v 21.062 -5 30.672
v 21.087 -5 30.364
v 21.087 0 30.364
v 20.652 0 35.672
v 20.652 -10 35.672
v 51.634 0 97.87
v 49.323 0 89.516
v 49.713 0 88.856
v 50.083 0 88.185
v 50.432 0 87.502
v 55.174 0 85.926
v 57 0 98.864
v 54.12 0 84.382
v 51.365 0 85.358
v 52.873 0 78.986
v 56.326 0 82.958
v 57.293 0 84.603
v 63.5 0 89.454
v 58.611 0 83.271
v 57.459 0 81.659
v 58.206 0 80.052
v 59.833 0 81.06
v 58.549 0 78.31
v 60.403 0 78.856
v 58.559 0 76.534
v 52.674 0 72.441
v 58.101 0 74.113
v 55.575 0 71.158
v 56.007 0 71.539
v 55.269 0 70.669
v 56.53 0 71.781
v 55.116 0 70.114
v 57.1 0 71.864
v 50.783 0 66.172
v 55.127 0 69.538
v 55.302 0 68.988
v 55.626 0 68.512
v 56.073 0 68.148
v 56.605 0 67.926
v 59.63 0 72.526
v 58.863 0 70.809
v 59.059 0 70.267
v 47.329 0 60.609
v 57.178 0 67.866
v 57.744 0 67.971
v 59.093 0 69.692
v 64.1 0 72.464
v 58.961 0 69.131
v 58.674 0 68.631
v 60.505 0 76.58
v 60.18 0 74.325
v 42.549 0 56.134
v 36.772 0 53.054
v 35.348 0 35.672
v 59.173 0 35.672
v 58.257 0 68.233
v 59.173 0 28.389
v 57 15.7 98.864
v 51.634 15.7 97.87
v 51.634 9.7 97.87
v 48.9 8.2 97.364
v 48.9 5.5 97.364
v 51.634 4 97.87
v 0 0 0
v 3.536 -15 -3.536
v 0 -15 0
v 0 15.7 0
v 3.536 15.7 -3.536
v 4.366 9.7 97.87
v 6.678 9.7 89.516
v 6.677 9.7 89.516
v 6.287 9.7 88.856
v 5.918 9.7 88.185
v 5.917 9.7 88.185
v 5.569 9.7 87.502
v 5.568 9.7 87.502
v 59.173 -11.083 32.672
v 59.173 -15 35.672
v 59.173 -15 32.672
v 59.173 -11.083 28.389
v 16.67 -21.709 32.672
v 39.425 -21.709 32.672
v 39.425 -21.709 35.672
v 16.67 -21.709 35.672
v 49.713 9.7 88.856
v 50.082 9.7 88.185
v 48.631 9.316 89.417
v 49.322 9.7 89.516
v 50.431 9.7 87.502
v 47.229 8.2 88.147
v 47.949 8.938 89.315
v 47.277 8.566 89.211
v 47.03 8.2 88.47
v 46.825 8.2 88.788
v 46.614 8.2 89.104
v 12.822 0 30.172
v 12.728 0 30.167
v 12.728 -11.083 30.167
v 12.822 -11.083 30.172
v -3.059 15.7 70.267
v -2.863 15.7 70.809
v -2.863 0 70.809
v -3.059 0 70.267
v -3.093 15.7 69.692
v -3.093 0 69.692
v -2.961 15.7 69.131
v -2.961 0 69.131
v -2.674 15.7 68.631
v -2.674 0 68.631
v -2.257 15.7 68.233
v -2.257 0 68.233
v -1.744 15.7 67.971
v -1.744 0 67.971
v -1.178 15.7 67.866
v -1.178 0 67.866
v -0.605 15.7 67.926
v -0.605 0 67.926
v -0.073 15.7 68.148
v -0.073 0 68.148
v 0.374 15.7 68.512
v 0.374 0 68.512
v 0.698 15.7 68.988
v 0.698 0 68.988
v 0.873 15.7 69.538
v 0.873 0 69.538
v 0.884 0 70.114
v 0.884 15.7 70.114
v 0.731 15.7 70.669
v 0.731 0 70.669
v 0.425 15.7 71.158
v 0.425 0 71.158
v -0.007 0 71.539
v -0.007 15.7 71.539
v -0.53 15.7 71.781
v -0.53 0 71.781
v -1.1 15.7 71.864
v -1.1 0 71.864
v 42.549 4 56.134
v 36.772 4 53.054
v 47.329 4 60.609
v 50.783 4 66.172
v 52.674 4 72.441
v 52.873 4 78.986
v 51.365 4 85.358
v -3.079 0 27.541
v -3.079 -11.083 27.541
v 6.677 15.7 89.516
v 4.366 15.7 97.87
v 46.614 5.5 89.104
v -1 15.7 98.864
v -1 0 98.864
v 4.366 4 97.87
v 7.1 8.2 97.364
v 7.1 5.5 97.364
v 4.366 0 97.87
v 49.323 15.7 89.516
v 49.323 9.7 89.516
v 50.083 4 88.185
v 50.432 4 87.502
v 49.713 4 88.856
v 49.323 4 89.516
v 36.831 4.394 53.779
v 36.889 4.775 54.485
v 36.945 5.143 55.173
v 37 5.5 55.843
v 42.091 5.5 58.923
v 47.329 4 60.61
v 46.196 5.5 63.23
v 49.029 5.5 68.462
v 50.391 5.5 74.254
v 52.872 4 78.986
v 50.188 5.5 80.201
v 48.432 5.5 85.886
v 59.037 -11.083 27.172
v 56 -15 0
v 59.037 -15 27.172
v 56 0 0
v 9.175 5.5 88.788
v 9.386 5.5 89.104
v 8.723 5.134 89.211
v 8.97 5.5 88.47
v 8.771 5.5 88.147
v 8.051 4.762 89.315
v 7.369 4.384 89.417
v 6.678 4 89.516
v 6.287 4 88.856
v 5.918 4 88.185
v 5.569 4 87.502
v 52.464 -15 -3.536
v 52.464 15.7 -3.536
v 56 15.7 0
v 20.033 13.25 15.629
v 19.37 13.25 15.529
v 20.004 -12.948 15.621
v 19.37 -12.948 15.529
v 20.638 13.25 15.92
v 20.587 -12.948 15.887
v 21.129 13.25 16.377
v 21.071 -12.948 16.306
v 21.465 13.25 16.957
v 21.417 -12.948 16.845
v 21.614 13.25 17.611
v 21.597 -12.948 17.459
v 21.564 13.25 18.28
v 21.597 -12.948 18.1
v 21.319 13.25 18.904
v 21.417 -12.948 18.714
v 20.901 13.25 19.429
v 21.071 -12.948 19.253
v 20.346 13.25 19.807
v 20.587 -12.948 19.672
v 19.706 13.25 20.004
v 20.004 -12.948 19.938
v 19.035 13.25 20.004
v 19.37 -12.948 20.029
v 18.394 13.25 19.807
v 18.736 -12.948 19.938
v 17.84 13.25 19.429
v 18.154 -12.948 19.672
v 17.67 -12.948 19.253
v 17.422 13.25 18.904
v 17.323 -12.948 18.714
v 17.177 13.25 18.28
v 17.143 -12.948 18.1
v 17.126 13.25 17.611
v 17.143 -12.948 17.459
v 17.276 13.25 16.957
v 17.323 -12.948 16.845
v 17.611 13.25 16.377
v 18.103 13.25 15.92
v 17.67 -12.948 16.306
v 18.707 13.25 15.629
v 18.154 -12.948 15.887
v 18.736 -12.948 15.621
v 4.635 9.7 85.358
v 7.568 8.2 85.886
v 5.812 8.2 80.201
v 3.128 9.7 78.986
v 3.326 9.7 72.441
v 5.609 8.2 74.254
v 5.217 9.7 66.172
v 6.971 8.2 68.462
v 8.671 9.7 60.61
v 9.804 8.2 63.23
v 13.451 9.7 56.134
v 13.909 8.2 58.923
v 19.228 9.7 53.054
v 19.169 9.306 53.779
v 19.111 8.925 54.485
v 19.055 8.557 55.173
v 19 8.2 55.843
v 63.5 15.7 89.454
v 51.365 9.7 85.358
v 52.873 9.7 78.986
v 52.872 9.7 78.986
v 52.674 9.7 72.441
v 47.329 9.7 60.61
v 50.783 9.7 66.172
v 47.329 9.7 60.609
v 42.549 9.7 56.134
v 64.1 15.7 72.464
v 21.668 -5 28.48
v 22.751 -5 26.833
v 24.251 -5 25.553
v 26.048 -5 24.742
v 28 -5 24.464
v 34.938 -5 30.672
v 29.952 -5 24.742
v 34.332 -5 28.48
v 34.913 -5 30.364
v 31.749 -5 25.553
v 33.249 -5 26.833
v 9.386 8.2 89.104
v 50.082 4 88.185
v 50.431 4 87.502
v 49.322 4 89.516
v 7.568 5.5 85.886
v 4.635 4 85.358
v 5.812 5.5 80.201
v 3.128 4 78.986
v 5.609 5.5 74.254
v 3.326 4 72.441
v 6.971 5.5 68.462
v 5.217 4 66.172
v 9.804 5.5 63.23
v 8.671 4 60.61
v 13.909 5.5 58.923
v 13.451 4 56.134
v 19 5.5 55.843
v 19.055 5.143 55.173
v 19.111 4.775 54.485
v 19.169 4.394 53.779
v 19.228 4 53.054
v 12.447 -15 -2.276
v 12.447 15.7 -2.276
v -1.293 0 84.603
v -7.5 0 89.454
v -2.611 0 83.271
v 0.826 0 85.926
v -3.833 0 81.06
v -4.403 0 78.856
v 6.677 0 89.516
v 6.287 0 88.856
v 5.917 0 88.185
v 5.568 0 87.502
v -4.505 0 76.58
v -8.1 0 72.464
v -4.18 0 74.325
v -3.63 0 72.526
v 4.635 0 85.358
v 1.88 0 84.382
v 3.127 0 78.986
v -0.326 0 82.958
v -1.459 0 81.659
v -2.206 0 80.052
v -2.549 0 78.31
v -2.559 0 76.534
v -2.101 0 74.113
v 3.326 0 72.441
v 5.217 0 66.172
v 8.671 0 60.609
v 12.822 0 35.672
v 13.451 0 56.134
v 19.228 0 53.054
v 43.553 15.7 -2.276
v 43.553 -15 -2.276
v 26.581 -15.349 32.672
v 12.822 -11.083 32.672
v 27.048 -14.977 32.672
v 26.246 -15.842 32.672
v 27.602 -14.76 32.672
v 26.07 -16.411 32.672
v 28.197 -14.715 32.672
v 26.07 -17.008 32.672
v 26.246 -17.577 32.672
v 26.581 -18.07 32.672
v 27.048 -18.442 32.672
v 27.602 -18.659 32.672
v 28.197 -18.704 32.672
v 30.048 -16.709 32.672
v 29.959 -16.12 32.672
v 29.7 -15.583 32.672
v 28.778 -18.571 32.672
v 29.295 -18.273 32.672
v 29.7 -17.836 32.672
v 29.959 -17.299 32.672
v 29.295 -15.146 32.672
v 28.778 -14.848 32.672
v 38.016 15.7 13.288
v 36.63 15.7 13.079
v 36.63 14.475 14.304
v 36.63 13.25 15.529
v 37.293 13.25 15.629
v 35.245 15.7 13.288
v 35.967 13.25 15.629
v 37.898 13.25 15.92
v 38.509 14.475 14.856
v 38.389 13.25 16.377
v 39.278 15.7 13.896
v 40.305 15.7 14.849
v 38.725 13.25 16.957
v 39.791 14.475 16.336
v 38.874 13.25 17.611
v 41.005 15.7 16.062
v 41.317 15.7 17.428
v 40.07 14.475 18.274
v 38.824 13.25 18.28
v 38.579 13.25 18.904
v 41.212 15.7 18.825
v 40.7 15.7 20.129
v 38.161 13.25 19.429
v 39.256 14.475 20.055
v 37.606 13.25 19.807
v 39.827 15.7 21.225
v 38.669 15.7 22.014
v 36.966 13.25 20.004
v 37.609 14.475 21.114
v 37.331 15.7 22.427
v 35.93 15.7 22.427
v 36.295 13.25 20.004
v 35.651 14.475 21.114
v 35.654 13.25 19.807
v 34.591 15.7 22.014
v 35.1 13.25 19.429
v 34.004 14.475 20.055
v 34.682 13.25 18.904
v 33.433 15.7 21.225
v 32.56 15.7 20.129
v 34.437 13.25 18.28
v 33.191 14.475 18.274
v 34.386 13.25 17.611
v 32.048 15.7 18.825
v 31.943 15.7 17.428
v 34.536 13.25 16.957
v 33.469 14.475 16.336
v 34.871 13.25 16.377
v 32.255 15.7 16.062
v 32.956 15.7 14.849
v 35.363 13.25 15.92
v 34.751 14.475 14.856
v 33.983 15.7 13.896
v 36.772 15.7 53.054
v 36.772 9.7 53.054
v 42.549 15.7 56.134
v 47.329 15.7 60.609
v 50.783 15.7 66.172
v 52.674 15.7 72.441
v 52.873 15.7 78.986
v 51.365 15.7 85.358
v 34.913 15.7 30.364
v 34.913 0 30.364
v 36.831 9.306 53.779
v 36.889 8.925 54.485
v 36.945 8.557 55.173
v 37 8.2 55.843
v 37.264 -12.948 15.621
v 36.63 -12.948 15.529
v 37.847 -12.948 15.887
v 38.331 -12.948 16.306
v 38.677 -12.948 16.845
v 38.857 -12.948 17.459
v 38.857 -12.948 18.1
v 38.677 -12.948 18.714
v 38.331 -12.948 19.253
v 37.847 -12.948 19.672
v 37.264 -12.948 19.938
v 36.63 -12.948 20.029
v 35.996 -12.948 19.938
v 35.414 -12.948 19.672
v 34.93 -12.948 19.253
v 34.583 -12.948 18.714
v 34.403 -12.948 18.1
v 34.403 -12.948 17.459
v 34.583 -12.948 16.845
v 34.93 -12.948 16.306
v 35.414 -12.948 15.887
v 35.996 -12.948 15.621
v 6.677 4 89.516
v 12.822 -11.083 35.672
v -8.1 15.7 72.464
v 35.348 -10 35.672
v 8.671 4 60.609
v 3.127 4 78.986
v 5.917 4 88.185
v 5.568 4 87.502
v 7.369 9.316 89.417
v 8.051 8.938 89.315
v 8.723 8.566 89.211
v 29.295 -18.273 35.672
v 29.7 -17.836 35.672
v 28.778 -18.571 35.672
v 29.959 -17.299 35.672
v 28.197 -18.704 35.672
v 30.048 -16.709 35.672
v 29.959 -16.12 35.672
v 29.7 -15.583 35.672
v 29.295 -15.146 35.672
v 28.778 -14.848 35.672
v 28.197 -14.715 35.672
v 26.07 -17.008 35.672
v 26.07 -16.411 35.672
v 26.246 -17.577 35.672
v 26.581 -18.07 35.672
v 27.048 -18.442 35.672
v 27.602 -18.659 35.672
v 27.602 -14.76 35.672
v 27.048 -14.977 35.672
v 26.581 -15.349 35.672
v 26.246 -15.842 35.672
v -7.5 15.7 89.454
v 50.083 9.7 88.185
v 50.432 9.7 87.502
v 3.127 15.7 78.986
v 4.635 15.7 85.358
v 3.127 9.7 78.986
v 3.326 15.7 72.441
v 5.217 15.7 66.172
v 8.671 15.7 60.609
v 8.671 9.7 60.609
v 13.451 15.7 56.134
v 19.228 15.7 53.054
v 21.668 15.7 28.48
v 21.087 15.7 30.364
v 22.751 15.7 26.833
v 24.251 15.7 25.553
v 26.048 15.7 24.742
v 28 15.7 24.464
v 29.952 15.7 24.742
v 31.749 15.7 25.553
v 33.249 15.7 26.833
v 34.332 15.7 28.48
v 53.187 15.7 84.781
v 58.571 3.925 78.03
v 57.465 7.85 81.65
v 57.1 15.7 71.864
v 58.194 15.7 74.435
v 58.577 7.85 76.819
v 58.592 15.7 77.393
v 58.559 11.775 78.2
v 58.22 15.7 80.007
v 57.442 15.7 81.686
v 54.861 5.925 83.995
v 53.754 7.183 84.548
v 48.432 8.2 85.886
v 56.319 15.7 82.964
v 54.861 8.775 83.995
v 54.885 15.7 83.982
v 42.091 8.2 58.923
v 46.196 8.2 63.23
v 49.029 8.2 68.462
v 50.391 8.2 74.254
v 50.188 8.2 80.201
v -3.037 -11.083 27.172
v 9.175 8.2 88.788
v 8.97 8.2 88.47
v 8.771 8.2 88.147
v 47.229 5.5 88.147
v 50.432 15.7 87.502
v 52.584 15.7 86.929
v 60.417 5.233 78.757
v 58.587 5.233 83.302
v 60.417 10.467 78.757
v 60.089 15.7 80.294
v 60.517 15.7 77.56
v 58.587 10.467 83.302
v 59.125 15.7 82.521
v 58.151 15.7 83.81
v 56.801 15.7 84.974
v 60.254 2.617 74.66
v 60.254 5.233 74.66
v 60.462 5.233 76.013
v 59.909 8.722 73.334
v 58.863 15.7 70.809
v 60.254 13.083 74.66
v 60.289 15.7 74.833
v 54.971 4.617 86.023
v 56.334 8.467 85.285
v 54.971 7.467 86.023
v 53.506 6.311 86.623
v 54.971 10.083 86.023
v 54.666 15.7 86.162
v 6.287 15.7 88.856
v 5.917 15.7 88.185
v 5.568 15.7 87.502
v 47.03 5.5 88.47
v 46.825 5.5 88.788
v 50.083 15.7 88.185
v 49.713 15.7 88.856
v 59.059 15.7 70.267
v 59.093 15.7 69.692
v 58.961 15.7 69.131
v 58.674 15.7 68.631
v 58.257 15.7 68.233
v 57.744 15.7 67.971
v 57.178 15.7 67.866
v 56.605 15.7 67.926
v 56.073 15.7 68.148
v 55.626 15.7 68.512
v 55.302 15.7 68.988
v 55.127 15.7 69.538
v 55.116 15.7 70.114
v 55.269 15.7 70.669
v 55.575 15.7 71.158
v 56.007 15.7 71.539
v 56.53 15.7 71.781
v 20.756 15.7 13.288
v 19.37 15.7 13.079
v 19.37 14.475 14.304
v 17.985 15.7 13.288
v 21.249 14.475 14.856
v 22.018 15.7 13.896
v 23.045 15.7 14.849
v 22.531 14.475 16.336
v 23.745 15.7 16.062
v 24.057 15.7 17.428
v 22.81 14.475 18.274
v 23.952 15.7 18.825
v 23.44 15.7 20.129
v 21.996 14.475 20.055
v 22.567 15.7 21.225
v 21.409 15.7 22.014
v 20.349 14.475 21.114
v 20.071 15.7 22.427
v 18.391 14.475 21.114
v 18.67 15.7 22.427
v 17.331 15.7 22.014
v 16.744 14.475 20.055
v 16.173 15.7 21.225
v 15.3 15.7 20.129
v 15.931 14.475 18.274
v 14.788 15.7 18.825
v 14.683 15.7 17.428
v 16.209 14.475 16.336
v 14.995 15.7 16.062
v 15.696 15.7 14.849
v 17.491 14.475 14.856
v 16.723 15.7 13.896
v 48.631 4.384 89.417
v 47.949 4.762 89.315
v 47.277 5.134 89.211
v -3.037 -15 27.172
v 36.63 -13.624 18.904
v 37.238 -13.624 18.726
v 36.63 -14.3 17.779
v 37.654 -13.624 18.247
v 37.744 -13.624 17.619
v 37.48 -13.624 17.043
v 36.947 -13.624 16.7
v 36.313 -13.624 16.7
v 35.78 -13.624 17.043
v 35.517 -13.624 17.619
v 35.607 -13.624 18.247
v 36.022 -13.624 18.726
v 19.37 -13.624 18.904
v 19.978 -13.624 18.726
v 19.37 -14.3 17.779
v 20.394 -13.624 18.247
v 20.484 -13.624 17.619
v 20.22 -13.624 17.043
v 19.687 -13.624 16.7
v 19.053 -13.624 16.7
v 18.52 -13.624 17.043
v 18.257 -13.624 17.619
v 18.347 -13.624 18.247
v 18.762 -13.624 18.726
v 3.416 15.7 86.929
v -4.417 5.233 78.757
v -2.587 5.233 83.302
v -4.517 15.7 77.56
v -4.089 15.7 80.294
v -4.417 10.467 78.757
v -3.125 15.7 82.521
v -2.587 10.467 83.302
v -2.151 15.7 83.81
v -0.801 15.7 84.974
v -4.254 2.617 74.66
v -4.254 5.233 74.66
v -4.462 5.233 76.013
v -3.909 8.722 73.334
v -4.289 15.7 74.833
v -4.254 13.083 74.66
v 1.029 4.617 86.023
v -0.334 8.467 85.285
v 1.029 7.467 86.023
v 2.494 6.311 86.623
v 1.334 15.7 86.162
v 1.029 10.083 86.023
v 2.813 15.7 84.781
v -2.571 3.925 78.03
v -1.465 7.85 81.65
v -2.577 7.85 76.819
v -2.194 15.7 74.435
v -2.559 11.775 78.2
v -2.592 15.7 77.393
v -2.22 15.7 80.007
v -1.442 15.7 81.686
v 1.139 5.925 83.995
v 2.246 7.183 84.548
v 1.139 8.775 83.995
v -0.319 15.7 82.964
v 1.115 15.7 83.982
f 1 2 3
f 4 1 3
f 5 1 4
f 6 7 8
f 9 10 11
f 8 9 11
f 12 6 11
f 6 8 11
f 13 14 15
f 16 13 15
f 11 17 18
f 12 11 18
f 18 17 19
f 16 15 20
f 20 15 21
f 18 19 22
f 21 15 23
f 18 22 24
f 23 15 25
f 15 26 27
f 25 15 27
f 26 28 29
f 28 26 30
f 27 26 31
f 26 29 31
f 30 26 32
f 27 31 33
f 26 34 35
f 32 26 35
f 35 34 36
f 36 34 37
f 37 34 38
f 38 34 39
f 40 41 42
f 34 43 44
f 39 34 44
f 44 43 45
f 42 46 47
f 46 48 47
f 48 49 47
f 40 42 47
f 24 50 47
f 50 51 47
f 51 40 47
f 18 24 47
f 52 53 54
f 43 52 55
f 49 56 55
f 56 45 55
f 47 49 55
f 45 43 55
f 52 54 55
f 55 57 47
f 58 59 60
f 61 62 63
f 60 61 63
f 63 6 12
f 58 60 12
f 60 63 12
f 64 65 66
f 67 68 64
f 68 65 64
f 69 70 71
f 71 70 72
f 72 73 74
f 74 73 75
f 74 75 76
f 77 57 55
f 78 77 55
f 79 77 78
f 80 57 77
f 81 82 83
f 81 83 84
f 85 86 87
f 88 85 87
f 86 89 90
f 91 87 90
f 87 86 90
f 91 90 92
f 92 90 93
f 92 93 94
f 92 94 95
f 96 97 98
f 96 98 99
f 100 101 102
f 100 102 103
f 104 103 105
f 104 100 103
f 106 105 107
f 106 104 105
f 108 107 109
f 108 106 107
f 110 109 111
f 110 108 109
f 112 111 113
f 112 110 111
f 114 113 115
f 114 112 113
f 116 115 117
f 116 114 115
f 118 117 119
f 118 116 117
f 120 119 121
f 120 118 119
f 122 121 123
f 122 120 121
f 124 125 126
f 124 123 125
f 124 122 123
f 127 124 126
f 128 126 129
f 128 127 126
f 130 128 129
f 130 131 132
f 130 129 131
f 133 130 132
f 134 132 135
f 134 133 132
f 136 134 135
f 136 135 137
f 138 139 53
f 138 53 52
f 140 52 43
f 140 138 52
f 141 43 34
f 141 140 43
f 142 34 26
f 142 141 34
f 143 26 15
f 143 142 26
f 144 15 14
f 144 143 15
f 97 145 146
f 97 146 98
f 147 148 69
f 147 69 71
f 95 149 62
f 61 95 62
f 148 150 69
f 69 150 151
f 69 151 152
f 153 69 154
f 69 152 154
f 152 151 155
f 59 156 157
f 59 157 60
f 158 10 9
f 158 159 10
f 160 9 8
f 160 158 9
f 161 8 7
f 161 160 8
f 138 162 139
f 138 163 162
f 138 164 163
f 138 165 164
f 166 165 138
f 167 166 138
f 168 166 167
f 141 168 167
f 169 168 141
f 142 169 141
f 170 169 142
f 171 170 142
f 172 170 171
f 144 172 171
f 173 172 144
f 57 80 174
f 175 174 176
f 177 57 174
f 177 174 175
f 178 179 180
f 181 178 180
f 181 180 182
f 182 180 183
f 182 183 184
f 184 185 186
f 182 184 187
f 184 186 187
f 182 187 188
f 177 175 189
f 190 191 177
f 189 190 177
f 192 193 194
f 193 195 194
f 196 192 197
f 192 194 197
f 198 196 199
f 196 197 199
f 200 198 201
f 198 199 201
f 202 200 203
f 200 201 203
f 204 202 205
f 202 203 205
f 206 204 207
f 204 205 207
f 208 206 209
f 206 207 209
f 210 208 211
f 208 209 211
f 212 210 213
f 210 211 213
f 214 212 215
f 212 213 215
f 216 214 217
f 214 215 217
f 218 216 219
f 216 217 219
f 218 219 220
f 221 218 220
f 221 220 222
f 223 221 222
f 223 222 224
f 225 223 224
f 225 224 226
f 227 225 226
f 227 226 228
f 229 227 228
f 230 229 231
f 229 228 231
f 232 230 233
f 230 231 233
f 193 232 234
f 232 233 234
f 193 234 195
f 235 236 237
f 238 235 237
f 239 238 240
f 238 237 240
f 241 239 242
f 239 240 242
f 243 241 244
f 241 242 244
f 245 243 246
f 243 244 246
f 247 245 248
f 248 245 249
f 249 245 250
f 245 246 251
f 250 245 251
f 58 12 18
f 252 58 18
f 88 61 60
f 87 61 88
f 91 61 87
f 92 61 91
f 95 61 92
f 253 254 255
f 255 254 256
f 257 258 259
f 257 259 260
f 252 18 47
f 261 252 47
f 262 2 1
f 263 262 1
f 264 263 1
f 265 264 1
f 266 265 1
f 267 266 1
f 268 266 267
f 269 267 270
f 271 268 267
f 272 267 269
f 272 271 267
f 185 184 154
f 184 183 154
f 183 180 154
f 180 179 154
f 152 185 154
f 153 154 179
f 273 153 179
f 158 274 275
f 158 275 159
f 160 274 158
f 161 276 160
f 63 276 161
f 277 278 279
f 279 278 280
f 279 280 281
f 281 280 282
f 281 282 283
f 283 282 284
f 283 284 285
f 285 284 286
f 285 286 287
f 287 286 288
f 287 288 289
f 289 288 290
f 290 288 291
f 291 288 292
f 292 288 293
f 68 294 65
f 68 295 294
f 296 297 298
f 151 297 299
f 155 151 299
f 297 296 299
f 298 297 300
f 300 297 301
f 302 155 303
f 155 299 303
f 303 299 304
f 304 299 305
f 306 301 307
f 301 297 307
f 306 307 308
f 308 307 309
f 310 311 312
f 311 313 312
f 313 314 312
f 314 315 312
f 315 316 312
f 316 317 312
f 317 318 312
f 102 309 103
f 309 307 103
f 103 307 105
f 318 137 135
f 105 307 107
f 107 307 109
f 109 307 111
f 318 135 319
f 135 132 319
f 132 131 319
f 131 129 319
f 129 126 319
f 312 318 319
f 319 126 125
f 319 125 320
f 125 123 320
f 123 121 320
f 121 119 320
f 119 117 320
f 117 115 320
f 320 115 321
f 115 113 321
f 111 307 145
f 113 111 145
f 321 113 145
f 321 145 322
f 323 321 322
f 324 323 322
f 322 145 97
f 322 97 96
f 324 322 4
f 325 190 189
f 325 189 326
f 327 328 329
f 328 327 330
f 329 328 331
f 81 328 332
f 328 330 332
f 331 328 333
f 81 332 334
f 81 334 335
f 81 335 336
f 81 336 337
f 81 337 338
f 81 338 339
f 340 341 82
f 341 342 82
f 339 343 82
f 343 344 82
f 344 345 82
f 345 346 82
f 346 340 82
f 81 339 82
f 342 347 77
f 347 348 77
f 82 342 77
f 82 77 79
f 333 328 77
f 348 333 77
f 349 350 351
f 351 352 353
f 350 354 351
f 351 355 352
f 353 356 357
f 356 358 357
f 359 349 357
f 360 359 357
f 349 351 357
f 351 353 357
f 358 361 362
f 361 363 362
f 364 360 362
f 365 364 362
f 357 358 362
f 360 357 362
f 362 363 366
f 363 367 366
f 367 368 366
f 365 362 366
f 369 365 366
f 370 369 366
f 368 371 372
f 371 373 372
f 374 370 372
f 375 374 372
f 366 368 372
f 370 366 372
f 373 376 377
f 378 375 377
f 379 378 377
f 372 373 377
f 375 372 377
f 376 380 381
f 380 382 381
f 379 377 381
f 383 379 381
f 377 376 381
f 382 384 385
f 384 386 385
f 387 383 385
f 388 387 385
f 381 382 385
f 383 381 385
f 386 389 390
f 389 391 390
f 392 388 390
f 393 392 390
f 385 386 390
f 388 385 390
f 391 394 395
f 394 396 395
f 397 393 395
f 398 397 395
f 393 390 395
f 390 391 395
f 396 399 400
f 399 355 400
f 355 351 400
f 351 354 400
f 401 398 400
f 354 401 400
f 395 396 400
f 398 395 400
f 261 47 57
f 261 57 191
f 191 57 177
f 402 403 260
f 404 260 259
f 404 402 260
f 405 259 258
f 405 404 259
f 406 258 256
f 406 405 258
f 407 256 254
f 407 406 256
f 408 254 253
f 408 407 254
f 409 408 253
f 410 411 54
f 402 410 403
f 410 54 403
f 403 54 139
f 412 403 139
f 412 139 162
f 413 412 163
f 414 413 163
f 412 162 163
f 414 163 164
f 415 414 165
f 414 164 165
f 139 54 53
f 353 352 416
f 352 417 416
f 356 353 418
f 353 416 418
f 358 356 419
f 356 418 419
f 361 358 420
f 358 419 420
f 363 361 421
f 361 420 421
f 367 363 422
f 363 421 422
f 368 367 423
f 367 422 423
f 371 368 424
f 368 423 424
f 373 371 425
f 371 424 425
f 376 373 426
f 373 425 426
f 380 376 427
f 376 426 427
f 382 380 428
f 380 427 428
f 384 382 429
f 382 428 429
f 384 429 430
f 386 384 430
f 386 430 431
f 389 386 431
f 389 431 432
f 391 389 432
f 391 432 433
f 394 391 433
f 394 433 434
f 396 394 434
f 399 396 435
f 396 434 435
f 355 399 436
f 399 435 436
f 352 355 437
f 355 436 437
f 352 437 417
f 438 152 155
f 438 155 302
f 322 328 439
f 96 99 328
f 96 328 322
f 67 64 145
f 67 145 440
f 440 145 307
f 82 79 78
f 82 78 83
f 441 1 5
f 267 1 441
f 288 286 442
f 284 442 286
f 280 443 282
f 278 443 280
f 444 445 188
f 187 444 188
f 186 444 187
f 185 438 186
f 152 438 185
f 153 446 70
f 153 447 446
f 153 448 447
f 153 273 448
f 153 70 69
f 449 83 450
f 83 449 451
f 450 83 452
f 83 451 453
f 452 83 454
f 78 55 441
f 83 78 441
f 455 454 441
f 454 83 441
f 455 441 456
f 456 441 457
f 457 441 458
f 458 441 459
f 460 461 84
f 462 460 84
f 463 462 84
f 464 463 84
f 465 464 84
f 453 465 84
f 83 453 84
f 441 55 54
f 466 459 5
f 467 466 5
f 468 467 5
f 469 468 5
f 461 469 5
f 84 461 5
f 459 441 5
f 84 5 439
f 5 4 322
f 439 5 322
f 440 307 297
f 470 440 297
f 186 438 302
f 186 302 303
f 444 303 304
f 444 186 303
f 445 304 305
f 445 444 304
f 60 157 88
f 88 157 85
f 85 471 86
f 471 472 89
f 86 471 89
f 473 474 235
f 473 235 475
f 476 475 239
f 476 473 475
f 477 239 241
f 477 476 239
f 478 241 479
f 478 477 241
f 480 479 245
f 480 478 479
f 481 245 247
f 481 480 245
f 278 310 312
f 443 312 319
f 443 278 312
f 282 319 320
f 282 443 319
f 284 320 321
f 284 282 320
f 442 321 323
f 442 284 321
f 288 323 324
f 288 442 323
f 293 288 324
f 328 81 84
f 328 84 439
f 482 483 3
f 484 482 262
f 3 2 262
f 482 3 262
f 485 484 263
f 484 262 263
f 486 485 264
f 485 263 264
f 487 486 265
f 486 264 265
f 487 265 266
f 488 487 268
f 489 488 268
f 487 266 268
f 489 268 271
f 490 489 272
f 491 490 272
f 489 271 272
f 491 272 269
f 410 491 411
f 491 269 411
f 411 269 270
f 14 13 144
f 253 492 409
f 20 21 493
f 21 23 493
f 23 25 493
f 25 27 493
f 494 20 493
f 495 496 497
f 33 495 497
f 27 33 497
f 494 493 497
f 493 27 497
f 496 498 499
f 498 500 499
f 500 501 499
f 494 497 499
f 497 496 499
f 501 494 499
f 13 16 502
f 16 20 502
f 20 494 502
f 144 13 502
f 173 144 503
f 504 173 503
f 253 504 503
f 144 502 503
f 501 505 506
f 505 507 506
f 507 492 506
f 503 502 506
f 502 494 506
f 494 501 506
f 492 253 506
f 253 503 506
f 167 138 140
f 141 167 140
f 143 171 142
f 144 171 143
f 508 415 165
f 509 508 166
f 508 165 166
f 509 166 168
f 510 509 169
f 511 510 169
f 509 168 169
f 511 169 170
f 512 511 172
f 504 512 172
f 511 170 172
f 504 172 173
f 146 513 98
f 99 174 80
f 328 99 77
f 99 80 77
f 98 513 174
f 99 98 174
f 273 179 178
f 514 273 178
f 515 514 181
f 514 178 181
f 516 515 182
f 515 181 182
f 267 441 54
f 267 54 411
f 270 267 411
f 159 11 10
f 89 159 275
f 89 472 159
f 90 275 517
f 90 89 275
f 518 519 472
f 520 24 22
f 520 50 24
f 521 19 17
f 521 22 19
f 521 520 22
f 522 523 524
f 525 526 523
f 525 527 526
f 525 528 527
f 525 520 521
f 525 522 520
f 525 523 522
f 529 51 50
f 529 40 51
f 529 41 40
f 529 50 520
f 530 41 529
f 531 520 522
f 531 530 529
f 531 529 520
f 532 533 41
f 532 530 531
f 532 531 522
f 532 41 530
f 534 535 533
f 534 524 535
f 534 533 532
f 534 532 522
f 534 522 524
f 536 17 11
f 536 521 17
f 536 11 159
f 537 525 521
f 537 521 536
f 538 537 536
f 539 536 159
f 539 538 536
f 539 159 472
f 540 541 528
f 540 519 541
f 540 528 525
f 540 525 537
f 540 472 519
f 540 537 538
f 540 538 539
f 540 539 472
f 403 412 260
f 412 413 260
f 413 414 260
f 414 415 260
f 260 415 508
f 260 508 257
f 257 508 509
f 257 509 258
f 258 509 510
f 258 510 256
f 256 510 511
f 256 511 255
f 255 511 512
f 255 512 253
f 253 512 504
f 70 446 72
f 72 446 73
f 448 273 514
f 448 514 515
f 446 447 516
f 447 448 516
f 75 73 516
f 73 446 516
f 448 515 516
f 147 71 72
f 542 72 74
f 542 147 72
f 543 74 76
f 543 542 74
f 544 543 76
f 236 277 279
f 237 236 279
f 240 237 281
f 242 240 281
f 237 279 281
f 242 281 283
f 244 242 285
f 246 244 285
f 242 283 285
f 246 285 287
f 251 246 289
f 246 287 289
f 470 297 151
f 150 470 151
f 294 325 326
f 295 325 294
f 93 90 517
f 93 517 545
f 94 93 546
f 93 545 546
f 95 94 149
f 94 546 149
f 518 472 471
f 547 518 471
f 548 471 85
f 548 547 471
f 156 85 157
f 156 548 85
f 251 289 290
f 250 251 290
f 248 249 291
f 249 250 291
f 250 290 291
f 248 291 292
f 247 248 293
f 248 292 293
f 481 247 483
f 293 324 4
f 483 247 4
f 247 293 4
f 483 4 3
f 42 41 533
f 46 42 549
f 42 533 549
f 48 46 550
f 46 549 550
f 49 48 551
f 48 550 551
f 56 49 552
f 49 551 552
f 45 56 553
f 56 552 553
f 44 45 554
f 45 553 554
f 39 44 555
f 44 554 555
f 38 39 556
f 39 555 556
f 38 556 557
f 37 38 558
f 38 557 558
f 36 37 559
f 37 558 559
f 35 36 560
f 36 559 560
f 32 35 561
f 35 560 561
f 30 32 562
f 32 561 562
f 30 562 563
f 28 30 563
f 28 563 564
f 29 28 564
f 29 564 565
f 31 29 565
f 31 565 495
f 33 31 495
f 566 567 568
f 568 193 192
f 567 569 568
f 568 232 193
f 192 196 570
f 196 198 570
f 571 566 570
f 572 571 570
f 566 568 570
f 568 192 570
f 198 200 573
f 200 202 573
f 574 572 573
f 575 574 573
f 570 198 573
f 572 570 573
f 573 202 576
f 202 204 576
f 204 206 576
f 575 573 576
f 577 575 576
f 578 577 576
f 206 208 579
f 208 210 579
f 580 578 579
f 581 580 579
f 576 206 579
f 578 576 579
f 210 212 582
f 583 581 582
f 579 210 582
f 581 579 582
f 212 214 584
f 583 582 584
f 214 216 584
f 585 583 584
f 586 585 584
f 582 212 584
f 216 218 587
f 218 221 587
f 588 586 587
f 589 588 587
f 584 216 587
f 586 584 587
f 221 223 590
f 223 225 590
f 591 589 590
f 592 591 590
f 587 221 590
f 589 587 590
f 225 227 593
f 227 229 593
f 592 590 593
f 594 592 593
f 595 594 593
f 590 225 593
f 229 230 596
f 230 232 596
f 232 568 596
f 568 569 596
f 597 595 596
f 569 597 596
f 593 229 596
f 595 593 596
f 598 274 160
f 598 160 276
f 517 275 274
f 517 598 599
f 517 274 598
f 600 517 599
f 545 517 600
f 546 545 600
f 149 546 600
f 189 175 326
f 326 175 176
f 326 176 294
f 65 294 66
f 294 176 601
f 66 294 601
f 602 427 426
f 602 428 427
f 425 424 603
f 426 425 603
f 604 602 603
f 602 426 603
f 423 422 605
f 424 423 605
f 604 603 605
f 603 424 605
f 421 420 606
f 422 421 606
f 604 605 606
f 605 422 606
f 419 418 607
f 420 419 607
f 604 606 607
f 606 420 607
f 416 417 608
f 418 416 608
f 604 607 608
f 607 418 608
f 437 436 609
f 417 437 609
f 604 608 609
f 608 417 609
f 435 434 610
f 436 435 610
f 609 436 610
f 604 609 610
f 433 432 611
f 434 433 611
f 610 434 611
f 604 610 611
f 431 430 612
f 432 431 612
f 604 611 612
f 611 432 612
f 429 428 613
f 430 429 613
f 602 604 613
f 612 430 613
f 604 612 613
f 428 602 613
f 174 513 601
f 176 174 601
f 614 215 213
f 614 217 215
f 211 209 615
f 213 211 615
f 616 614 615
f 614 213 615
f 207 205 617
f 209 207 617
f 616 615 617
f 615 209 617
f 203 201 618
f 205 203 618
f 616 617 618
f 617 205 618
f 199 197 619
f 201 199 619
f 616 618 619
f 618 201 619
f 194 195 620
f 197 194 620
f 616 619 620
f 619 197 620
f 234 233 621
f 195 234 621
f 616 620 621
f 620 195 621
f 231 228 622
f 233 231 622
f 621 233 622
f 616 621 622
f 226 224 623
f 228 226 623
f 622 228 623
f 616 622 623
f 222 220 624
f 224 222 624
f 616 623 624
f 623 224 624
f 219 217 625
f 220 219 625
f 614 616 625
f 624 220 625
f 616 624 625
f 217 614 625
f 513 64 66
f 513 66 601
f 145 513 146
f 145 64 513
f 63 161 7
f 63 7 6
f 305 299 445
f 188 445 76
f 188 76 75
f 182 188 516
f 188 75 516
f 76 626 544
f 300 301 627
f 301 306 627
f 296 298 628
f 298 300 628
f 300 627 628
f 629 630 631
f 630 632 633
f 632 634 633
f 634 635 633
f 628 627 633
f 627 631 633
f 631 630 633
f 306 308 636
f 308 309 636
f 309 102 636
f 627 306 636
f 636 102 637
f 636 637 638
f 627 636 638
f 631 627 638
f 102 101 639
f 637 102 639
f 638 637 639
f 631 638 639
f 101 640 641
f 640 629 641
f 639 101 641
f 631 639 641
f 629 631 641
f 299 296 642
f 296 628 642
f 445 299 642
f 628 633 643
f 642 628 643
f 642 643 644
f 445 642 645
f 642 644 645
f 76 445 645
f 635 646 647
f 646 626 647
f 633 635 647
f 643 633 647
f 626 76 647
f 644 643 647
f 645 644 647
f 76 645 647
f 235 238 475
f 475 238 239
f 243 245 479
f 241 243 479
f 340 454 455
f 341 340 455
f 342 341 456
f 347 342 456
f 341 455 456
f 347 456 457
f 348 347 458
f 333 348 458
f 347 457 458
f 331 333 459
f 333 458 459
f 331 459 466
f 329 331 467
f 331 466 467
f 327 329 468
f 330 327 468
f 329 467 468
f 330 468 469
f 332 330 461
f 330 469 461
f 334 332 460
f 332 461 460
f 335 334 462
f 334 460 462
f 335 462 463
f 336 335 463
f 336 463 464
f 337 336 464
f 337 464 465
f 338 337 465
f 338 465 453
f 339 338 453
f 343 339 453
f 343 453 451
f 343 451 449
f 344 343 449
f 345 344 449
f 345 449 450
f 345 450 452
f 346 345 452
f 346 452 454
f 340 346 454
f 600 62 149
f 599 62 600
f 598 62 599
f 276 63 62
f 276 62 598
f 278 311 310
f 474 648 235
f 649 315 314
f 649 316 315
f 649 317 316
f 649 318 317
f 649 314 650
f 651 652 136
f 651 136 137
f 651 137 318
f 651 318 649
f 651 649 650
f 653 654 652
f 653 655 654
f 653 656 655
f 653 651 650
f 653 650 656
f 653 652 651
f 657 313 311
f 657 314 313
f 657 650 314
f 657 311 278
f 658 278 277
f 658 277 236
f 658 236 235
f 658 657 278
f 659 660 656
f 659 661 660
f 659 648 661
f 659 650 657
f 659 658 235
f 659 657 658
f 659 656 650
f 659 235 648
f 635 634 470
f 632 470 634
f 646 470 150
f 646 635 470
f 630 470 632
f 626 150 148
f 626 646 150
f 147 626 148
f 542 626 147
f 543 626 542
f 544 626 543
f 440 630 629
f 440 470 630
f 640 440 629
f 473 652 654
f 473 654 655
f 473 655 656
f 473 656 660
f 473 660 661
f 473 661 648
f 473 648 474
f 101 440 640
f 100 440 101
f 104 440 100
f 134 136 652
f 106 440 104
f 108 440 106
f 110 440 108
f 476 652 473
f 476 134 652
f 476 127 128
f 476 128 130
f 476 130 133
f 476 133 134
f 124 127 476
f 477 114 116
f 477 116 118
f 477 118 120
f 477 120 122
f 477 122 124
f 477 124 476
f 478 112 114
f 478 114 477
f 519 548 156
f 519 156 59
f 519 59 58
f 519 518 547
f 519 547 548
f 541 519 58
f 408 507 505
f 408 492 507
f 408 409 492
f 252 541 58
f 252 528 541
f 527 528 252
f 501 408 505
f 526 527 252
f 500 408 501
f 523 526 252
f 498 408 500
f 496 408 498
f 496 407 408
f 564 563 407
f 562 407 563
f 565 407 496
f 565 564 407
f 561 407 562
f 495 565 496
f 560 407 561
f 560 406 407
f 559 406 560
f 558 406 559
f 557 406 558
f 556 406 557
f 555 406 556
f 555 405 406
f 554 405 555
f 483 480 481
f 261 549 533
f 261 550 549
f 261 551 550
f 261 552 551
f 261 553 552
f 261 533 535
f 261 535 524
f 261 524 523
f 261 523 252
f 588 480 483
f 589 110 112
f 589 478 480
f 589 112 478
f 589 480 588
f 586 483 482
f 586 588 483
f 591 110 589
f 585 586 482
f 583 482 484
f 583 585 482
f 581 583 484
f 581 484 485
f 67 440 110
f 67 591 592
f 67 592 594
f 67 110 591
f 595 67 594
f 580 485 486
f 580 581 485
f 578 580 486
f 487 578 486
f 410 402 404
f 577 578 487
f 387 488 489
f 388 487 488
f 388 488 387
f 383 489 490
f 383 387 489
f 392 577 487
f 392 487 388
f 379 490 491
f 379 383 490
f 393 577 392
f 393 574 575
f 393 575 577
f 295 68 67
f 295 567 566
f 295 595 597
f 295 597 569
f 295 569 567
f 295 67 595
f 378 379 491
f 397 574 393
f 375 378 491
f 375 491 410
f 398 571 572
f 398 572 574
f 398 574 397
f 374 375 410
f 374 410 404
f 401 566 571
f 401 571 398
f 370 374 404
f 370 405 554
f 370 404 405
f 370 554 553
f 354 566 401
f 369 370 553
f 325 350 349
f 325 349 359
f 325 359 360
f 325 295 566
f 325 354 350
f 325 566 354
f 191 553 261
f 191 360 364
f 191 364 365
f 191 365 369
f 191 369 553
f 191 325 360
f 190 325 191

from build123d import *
from OCP.BRepFilletAPI import BRepFilletAPI_MakeChamfer

# Parameters (mm, degrees)
EXTRUDE_1_DEPTH                                 = 15.7
CUT_EXTRUDE_5_DEPTH                             = 6
CUT_EXTRUDE_START                               = -4
CUT_EXTRUDE_6_DEPTH                             = 4
CHAMFER_2_SIZE                                  = 2.5
CHAMFER_2_SIZE_2                                = 1.5
CHAMFER_3_SIZE                                  = 2.5
CHAMFER_3_SIZE_2                                = 1.5
CHAMFER_4_SIZE                                  = 2.5
CHAMFER_4_SIZE_2                                = 1.5
CHAMFER_5_SIZE                                  = 1.5
CHAMFER_5_SIZE_2                                = 2.5
CUT_EXTRUDE_7_DEPTH                             = 20
BOSS_EXTRUDE2_DEPTH                             = 15
CSK_FOR_M4_FLAT_HEAD_MACHINE_SCREW1_D           = 4.5
CSK_FOR_M4_FLAT_HEAD_MACHINE_SCREW1_DEPTH       = 28.648063607
CSK_FOR_M4_FLAT_HEAD_MACHINE_SCREW1_CSINK_D     = 9.4
CSK_FOR_M4_FLAT_HEAD_MACHINE_SCREW1_CSINK_ANGLE = 90
CSK_FOR_M4_FLAT_HEAD_MACHINE_SCREW1_TIP         = 1.351936393
BOSS_EXTRUDE3_DEPTH                             = 3
BOSS_EXTRUDE3_DEPTH_BACK                        = 4.283096
CUT_EXTRUDE1_DEPTH                              = 122.536445899
CUT_EXTRUDE2_START                              = -5
CUT_EXTRUDE2_DEPTH                              = 5
CHAMFER1_SIZE                                   = 5
CUT_EXTRUDE3_REACH                              = 94.592
SKETCH9_R                                       = 2


with BuildPart() as part:
    # Эскиз1 → Бобышка-Вытянуть1 (new body)
    with BuildSketch(Plane(origin=(0, 0, 0), x_dir=(1, 0, 0), z_dir=(0, 1, 0))):
        with BuildLine():
            Line((19, -55.842875467), (21.087010541, -30.364203971))
            ThreePointArc((21.087010541, -30.364203971), (28, -24.464466094), (34.912989459, -30.364203971))
            Line((34.912989459, -30.364203971), (37, -55.842875467))
            ThreePointArc((37, -55.842875467), (49.615065571, -70.216351148), (46.614482007, -89.103732671))
            Line((46.614482007, -89.103732671), (48.9, -97.364070254))
            Line((48.9, -97.364070254), (57, -98.864070254))
            Line((57, -98.864070254), (63.5, -89.453874559))
            Line((63.5, -89.453874559), (64.1, -72.464466094))
            Line((64.1, -72.464466094), (56, 0))
            Line((56, 0), (52.464466094, 3.535533906))
            Line((52.464466094, 3.535533906), (43.553055011, 2.275870258))
            Line((43.553055011, 2.275870258), (12.446944989, 2.275870258))
            Line((12.446944989, 2.275870258), (3.535533906, 3.535533906))
            Line((3.535533906, 3.535533906), (0, 0))
            Line((0, 0), (-8.1, -72.464466094))
            Line((-8.1, -72.464466094), (-7.5, -89.453874559))
            Line((-7.5, -89.453874559), (-1, -98.864070254))
            Line((-1, -98.864070254), (7.1, -97.364070254))
            Line((7.1, -97.364070254), (9.385517993, -89.103732671))
            ThreePointArc((9.385517993, -89.103732671), (6.384934429, -70.216351148), (19, -55.842875467))
        make_face()
    extrude(amount=EXTRUDE_1_DEPTH)

    # Эскиз9 → Вырез-Вытянуть5 (cut)
    with BuildSketch(Plane(origin=(0, 15.7, 0), x_dir=(1, 0, 0), z_dir=(0, 1, 0))):
        with BuildLine():
            Line((4.070420212, -98.938601985), (6.67745221, -89.516245887))
            ThreePointArc((6.67745221, -89.516245887), (28, -51.464466094), (49.32254779, -89.516245887))
            Line((49.32254779, -89.516245887), (51.928879153, -98.936069744))
            Line((51.928879153, -98.936069744), (4.070420212, -98.938601985))
        make_face()
    extrude(amount=-CUT_EXTRUDE_5_DEPTH, mode=Mode.SUBTRACT)

    # Эскиз10 → Вырез-Вытянуть6 (cut)
    with BuildSketch(Plane.XZ.offset(CUT_EXTRUDE_START)):
        with BuildLine():
            Line((49.32254779, 89.516245887), (52.714892846, 101.77688678))
            Line((52.714892846, 101.77688678), (2.982429051, 102.870828422))
            Line((2.982429051, 102.870828422), (6.67745221, 89.516245887))
            ThreePointArc((6.67745221, 89.516245887), (28, 51.464466094), (49.32254779, 89.516245887))
        make_face()
    extrude(amount=CUT_EXTRUDE_6_DEPTH, mode=Mode.SUBTRACT)

    # Фаска2
    chamfer_2_edges_1 = [part.edges().sort_by_distance(p)[0] for p in [
        (8.242758997, 9.7, 93.233901463),
    ]]
    chamfer_2_side_1 = [part.faces().sort_by_distance(p)[0] for p in [
        (8.213845332, 9.7, 93.225901463),
    ]]
    chamfer_2_edges_2 = [part.edges().sort_by_distance(p)[0] for p in [
        (6.384934429, 9.7, 70.216351148),
    ]]
    chamfer_2_side_2 = [part.faces().sort_by_distance(p)[0] for p in [
        (6.356114342, 9.7, 70.208020328),
    ]]
    chamfer_2 = BRepFilletAPI_MakeChamfer(part.part.solid().wrapped)
    for e in chamfer_2_edges_1:
        chamfer_2.Add(CHAMFER_2_SIZE - 0.0001, CHAMFER_2_SIZE_2 - 0.0001, e.wrapped, chamfer_2_side_1[0].wrapped)
    for e in chamfer_2_edges_2:
        chamfer_2.Add(CHAMFER_2_SIZE - 0.0001, CHAMFER_2_SIZE_2 - 0.0001, e.wrapped, chamfer_2_side_2[0].wrapped)
    add(Compound.cast(chamfer_2.Shape()), mode=Mode.REPLACE)  # a hair under: the kernel refuses the full size

    # Фаска3
    chamfer_3_edges_1 = [part.edges().sort_by_distance(p)[0] for p in [
        (8.242758997, 4, 93.233901463),
    ]]
    chamfer_3_side_1 = [part.faces().sort_by_distance(p)[0] for p in [
        (8.213845332, 4, 93.225901463),
    ]]
    chamfer_3_edges_2 = [part.edges().sort_by_distance(p)[0] for p in [
        (6.384934429, 4, 70.216351148),
    ]]
    chamfer_3_side_2 = [part.faces().sort_by_distance(p)[0] for p in [
        (6.384934429, 4.03, 70.216351148),
    ]]
    chamfer_3 = BRepFilletAPI_MakeChamfer(part.part.solid().wrapped)
    for e in chamfer_3_edges_1:
        chamfer_3.Add(CHAMFER_3_SIZE - 0.0001, CHAMFER_3_SIZE_2 - 0.0001, e.wrapped, chamfer_3_side_1[0].wrapped)
    for e in chamfer_3_edges_2:
        chamfer_3.Add(CHAMFER_3_SIZE_2 - 0.0001, CHAMFER_3_SIZE - 0.0001, e.wrapped, chamfer_3_side_2[0].wrapped)
    add(Compound.cast(chamfer_3.Shape()), mode=Mode.REPLACE)  # a hair under: the kernel refuses the full size

    # Фаска4
    chamfer_4_edges_1 = [part.edges().sort_by_distance(p)[0] for p in [
        (47.757241003, 9.7, 93.233901463),
    ]]
    chamfer_4_side_1 = [part.faces().sort_by_distance(p)[0] for p in [
        (47.786154668, 9.7, 93.225901463),
    ]]
    chamfer_4_edges_2 = [part.edges().sort_by_distance(p)[0] for p in [
        (49.615065571, 9.7, 70.216351148),
    ]]
    chamfer_4_side_2 = [part.faces().sort_by_distance(p)[0] for p in [
        (49.643885658, 9.7, 70.208020328),
    ]]
    chamfer_4 = BRepFilletAPI_MakeChamfer(part.part.solid().wrapped)
    for e in chamfer_4_edges_1:
        chamfer_4.Add(CHAMFER_4_SIZE - 0.0001, CHAMFER_4_SIZE_2 - 0.0001, e.wrapped, chamfer_4_side_1[0].wrapped)
    for e in chamfer_4_edges_2:
        chamfer_4.Add(CHAMFER_4_SIZE - 0.0001, CHAMFER_4_SIZE_2 - 0.0001, e.wrapped, chamfer_4_side_2[0].wrapped)
    add(Compound.cast(chamfer_4.Shape()), mode=Mode.REPLACE)  # a hair under: the kernel refuses the full size

    # Фаска5
    chamfer_5_edges_1 = [part.edges().sort_by_distance(p)[0] for p in [
        (47.757241003, 4, 93.233901463),
    ]]
    chamfer_5_side_1 = [part.faces().sort_by_distance(p)[0] for p in [
        (47.757241003, 4.03, 93.233901463),
    ]]
    chamfer_5_edges_2 = [part.edges().sort_by_distance(p)[0] for p in [
        (49.615065571, 4, 70.216351148),
    ]]
    chamfer_5_side_2 = [part.faces().sort_by_distance(p)[0] for p in [
        (49.643885658, 4, 70.208020328),
    ]]
    chamfer_5 = BRepFilletAPI_MakeChamfer(part.part.solid().wrapped)
    for e in chamfer_5_edges_1:
        chamfer_5.Add(CHAMFER_5_SIZE - 0.0001, CHAMFER_5_SIZE_2 - 0.0001, e.wrapped, chamfer_5_side_1[0].wrapped)
    for e in chamfer_5_edges_2:
        chamfer_5.Add(CHAMFER_5_SIZE_2 - 0.0001, CHAMFER_5_SIZE - 0.0001, e.wrapped, chamfer_5_side_2[0].wrapped)
    add(Compound.cast(chamfer_5.Shape()), mode=Mode.REPLACE)  # a hair under: the kernel refuses the full size

    # Эскиз11 → Вырез-Вытянуть7 (cut)
    with BuildSketch(Plane(origin=(0, 15.7, 0), x_dir=(1, 0, 0), z_dir=(0, 1, 0))):
        with BuildLine():
            Line((46.426049473, -86.017959352), (46.012822205, -88.379258027))
            add(Edge.make_bspline(
                [(58.862726543, -70.808948625), (60.119619749, -73.228227212), (61.202001727, -77.673197621), (57.883666669, -86.609034293), (49.905997231, -87.608281842), (46.012822205, -88.379258027)],
                knots=[0, 0, 0, 0, 0.305163468, 0.487677304, 1, 1, 1, 1], degree=3))
            ThreePointArc((58.862726543, -70.808948625), (56.072808864, -68.148005462), (57.1, -71.864070254))
            add(Edge.make_bspline(
                [(57.1, -71.864070254), (58.73856603, -74.489449168), (59.890065943, -84.15910166), (49.798382886, -85.957388163), (46.426049473, -86.017959352)],
                knots=[0, 0, 0, 0, 0.454203244, 1, 1, 1, 1], degree=3))
        make_face()
        with BuildLine():
            Line((9.573950527, -86.017959352), (9.987177795, -88.379258027))
            add(Edge.make_bspline(
                [(-2.862726543, -70.808948625), (-4.119619749, -73.228227212), (-5.202001727, -77.673197621), (-1.883666669, -86.609034293), (6.094002769, -87.608281842), (9.987177795, -88.379258027)],
                knots=[0, 0, 0, 0, 0.305163468, 0.487677304, 1, 1, 1, 1], degree=3))
            ThreePointArc((-2.862726543, -70.808948625), (-0.072808864, -68.148005462), (-1.1, -71.864070254))
            add(Edge.make_bspline(
                [(-1.1, -71.864070254), (-2.73856603, -74.489449168), (-3.890065943, -84.15910166), (6.201617114, -85.957388163), (9.573950527, -86.017959352)],
                knots=[0, 0, 0, 0, 0.454203244, 1, 1, 1, 1], degree=3))
        make_face()
    extrude(amount=-CUT_EXTRUDE_7_DEPTH, mode=Mode.SUBTRACT)

    # Sketch5 → Boss-Extrude2 (add)
    with BuildSketch(Plane.XZ):
        Polygon((3.535533906, -3.535533906), (0, 0), (-3.078509959, 27.541059326), (12.727631466, 30.166723248), (28.000118409, 31.014994944), (59.173331778, 28.389357167), (56, 0), (52.464466094, -3.535533906), (43.553055011, -2.275870258), (12.446944989, -2.275870258), align=None)
    extrude(amount=BOSS_EXTRUDE2_DEPTH)

    # CSK for M4 Flat Head Machine Screw1
    with Locations(Plane(origin=(19.370167772, 15.7, 17.779382006), x_dir=(0, 0, 1), z_dir=(0, 1, 0))):
        with Locations((0, 0), (0, 17.26)):
            CounterSinkHole(CSK_FOR_M4_FLAT_HEAD_MACHINE_SCREW1_D / 2, CSK_FOR_M4_FLAT_HEAD_MACHINE_SCREW1_CSINK_D / 2, depth=CSK_FOR_M4_FLAT_HEAD_MACHINE_SCREW1_DEPTH, counter_sink_angle=CSK_FOR_M4_FLAT_HEAD_MACHINE_SCREW1_CSINK_ANGLE)
            with Locations((0, 0, -(CSK_FOR_M4_FLAT_HEAD_MACHINE_SCREW1_DEPTH + CSK_FOR_M4_FLAT_HEAD_MACHINE_SCREW1_TIP / 2))):  # 118° drill point
                Cone(0, CSK_FOR_M4_FLAT_HEAD_MACHINE_SCREW1_D / 2, CSK_FOR_M4_FLAT_HEAD_MACHINE_SCREW1_TIP, mode=Mode.SUBTRACT)

    # Sketch6 → Boss-Extrude3 (add, two sides: drawn at the far end of the back side and taken through both)
    with BuildSketch(Plane.XY.offset(32.6724529).offset(-BOSS_EXTRUDE3_DEPTH_BACK)):
        Polygon((12.822450363, -11.082801181), (12.822450363, 0), (59.173331778, 0), (59.173331778, -15), (39.425133125, -21.709493147), (16.66992259, -21.709493147), align=None)
    extrude(amount=BOSS_EXTRUDE3_DEPTH + BOSS_EXTRUDE3_DEPTH_BACK)

    # Sketch7 → Cut-Extrude1 (cut, through all)
    with BuildSketch(Plane(origin=(59.173331778, 0, 0), x_dir=(0, 0, -1), z_dir=(1, 0, 0))):
        Polygon((-32.6724529, -22.263045792), (-32.6724529, -12.082801181), (-32.6724529, -11.082801181), (-31.6724529, -11.082801181), (-27.1724529, -11.082801181), (-27.1724529, -22.263045792), align=None)
    extrude(amount=-CUT_EXTRUDE1_DEPTH, mode=Mode.SUBTRACT)

    # Sketch8 → Cut-Extrude2 (cut)
    with BuildSketch(Plane(origin=(0, 0, 0), x_dir=(1, 0, 0), z_dir=(0, 1, 0)).offset(CUT_EXTRUDE2_START)):
        with BuildLine():
            Line((35.347799079, -35.6724529), (34.912989459, -30.364203971))
            ThreePointArc((34.912989459, -30.364203971), (28, -24.464466094), (21.087010541, -30.364203971))
            Line((21.087010541, -30.364203971), (20.652200921, -35.6724529))
            Line((20.652200921, -35.6724529), (35.347799079, -35.6724529))
        make_face()
    extrude(amount=CUT_EXTRUDE2_DEPTH, mode=Mode.SUBTRACT)

    # Chamfer1
    chamfer1_edges = [part.edges().sort_by_distance(p)[0] for p in [
        (28, -5, 35.6724529),
    ]]
    chamfer(chamfer1_edges, length=CHAMFER1_SIZE)

    # Sketch9 → Cut-Extrude3 (cut, up to next)
    with BuildSketch(Plane.XY.offset(35.6724529), mode=Mode.PRIVATE) as cut_extrude3_sk1:
        with Locations((28.047527858, -16.709493147)):
            Circle(SKETCH9_R)
    cut_extrude3_tool1 = extrude(cut_extrude3_sk1.sketch, amount=-CUT_EXTRUDE3_REACH, mode=Mode.PRIVATE) & part.part
    add(cut_extrude3_tool1.solids().sort_by_distance((28.047528, -16.709493, 35.672453))[0], mode=Mode.SUBTRACT)


solid = part.part
